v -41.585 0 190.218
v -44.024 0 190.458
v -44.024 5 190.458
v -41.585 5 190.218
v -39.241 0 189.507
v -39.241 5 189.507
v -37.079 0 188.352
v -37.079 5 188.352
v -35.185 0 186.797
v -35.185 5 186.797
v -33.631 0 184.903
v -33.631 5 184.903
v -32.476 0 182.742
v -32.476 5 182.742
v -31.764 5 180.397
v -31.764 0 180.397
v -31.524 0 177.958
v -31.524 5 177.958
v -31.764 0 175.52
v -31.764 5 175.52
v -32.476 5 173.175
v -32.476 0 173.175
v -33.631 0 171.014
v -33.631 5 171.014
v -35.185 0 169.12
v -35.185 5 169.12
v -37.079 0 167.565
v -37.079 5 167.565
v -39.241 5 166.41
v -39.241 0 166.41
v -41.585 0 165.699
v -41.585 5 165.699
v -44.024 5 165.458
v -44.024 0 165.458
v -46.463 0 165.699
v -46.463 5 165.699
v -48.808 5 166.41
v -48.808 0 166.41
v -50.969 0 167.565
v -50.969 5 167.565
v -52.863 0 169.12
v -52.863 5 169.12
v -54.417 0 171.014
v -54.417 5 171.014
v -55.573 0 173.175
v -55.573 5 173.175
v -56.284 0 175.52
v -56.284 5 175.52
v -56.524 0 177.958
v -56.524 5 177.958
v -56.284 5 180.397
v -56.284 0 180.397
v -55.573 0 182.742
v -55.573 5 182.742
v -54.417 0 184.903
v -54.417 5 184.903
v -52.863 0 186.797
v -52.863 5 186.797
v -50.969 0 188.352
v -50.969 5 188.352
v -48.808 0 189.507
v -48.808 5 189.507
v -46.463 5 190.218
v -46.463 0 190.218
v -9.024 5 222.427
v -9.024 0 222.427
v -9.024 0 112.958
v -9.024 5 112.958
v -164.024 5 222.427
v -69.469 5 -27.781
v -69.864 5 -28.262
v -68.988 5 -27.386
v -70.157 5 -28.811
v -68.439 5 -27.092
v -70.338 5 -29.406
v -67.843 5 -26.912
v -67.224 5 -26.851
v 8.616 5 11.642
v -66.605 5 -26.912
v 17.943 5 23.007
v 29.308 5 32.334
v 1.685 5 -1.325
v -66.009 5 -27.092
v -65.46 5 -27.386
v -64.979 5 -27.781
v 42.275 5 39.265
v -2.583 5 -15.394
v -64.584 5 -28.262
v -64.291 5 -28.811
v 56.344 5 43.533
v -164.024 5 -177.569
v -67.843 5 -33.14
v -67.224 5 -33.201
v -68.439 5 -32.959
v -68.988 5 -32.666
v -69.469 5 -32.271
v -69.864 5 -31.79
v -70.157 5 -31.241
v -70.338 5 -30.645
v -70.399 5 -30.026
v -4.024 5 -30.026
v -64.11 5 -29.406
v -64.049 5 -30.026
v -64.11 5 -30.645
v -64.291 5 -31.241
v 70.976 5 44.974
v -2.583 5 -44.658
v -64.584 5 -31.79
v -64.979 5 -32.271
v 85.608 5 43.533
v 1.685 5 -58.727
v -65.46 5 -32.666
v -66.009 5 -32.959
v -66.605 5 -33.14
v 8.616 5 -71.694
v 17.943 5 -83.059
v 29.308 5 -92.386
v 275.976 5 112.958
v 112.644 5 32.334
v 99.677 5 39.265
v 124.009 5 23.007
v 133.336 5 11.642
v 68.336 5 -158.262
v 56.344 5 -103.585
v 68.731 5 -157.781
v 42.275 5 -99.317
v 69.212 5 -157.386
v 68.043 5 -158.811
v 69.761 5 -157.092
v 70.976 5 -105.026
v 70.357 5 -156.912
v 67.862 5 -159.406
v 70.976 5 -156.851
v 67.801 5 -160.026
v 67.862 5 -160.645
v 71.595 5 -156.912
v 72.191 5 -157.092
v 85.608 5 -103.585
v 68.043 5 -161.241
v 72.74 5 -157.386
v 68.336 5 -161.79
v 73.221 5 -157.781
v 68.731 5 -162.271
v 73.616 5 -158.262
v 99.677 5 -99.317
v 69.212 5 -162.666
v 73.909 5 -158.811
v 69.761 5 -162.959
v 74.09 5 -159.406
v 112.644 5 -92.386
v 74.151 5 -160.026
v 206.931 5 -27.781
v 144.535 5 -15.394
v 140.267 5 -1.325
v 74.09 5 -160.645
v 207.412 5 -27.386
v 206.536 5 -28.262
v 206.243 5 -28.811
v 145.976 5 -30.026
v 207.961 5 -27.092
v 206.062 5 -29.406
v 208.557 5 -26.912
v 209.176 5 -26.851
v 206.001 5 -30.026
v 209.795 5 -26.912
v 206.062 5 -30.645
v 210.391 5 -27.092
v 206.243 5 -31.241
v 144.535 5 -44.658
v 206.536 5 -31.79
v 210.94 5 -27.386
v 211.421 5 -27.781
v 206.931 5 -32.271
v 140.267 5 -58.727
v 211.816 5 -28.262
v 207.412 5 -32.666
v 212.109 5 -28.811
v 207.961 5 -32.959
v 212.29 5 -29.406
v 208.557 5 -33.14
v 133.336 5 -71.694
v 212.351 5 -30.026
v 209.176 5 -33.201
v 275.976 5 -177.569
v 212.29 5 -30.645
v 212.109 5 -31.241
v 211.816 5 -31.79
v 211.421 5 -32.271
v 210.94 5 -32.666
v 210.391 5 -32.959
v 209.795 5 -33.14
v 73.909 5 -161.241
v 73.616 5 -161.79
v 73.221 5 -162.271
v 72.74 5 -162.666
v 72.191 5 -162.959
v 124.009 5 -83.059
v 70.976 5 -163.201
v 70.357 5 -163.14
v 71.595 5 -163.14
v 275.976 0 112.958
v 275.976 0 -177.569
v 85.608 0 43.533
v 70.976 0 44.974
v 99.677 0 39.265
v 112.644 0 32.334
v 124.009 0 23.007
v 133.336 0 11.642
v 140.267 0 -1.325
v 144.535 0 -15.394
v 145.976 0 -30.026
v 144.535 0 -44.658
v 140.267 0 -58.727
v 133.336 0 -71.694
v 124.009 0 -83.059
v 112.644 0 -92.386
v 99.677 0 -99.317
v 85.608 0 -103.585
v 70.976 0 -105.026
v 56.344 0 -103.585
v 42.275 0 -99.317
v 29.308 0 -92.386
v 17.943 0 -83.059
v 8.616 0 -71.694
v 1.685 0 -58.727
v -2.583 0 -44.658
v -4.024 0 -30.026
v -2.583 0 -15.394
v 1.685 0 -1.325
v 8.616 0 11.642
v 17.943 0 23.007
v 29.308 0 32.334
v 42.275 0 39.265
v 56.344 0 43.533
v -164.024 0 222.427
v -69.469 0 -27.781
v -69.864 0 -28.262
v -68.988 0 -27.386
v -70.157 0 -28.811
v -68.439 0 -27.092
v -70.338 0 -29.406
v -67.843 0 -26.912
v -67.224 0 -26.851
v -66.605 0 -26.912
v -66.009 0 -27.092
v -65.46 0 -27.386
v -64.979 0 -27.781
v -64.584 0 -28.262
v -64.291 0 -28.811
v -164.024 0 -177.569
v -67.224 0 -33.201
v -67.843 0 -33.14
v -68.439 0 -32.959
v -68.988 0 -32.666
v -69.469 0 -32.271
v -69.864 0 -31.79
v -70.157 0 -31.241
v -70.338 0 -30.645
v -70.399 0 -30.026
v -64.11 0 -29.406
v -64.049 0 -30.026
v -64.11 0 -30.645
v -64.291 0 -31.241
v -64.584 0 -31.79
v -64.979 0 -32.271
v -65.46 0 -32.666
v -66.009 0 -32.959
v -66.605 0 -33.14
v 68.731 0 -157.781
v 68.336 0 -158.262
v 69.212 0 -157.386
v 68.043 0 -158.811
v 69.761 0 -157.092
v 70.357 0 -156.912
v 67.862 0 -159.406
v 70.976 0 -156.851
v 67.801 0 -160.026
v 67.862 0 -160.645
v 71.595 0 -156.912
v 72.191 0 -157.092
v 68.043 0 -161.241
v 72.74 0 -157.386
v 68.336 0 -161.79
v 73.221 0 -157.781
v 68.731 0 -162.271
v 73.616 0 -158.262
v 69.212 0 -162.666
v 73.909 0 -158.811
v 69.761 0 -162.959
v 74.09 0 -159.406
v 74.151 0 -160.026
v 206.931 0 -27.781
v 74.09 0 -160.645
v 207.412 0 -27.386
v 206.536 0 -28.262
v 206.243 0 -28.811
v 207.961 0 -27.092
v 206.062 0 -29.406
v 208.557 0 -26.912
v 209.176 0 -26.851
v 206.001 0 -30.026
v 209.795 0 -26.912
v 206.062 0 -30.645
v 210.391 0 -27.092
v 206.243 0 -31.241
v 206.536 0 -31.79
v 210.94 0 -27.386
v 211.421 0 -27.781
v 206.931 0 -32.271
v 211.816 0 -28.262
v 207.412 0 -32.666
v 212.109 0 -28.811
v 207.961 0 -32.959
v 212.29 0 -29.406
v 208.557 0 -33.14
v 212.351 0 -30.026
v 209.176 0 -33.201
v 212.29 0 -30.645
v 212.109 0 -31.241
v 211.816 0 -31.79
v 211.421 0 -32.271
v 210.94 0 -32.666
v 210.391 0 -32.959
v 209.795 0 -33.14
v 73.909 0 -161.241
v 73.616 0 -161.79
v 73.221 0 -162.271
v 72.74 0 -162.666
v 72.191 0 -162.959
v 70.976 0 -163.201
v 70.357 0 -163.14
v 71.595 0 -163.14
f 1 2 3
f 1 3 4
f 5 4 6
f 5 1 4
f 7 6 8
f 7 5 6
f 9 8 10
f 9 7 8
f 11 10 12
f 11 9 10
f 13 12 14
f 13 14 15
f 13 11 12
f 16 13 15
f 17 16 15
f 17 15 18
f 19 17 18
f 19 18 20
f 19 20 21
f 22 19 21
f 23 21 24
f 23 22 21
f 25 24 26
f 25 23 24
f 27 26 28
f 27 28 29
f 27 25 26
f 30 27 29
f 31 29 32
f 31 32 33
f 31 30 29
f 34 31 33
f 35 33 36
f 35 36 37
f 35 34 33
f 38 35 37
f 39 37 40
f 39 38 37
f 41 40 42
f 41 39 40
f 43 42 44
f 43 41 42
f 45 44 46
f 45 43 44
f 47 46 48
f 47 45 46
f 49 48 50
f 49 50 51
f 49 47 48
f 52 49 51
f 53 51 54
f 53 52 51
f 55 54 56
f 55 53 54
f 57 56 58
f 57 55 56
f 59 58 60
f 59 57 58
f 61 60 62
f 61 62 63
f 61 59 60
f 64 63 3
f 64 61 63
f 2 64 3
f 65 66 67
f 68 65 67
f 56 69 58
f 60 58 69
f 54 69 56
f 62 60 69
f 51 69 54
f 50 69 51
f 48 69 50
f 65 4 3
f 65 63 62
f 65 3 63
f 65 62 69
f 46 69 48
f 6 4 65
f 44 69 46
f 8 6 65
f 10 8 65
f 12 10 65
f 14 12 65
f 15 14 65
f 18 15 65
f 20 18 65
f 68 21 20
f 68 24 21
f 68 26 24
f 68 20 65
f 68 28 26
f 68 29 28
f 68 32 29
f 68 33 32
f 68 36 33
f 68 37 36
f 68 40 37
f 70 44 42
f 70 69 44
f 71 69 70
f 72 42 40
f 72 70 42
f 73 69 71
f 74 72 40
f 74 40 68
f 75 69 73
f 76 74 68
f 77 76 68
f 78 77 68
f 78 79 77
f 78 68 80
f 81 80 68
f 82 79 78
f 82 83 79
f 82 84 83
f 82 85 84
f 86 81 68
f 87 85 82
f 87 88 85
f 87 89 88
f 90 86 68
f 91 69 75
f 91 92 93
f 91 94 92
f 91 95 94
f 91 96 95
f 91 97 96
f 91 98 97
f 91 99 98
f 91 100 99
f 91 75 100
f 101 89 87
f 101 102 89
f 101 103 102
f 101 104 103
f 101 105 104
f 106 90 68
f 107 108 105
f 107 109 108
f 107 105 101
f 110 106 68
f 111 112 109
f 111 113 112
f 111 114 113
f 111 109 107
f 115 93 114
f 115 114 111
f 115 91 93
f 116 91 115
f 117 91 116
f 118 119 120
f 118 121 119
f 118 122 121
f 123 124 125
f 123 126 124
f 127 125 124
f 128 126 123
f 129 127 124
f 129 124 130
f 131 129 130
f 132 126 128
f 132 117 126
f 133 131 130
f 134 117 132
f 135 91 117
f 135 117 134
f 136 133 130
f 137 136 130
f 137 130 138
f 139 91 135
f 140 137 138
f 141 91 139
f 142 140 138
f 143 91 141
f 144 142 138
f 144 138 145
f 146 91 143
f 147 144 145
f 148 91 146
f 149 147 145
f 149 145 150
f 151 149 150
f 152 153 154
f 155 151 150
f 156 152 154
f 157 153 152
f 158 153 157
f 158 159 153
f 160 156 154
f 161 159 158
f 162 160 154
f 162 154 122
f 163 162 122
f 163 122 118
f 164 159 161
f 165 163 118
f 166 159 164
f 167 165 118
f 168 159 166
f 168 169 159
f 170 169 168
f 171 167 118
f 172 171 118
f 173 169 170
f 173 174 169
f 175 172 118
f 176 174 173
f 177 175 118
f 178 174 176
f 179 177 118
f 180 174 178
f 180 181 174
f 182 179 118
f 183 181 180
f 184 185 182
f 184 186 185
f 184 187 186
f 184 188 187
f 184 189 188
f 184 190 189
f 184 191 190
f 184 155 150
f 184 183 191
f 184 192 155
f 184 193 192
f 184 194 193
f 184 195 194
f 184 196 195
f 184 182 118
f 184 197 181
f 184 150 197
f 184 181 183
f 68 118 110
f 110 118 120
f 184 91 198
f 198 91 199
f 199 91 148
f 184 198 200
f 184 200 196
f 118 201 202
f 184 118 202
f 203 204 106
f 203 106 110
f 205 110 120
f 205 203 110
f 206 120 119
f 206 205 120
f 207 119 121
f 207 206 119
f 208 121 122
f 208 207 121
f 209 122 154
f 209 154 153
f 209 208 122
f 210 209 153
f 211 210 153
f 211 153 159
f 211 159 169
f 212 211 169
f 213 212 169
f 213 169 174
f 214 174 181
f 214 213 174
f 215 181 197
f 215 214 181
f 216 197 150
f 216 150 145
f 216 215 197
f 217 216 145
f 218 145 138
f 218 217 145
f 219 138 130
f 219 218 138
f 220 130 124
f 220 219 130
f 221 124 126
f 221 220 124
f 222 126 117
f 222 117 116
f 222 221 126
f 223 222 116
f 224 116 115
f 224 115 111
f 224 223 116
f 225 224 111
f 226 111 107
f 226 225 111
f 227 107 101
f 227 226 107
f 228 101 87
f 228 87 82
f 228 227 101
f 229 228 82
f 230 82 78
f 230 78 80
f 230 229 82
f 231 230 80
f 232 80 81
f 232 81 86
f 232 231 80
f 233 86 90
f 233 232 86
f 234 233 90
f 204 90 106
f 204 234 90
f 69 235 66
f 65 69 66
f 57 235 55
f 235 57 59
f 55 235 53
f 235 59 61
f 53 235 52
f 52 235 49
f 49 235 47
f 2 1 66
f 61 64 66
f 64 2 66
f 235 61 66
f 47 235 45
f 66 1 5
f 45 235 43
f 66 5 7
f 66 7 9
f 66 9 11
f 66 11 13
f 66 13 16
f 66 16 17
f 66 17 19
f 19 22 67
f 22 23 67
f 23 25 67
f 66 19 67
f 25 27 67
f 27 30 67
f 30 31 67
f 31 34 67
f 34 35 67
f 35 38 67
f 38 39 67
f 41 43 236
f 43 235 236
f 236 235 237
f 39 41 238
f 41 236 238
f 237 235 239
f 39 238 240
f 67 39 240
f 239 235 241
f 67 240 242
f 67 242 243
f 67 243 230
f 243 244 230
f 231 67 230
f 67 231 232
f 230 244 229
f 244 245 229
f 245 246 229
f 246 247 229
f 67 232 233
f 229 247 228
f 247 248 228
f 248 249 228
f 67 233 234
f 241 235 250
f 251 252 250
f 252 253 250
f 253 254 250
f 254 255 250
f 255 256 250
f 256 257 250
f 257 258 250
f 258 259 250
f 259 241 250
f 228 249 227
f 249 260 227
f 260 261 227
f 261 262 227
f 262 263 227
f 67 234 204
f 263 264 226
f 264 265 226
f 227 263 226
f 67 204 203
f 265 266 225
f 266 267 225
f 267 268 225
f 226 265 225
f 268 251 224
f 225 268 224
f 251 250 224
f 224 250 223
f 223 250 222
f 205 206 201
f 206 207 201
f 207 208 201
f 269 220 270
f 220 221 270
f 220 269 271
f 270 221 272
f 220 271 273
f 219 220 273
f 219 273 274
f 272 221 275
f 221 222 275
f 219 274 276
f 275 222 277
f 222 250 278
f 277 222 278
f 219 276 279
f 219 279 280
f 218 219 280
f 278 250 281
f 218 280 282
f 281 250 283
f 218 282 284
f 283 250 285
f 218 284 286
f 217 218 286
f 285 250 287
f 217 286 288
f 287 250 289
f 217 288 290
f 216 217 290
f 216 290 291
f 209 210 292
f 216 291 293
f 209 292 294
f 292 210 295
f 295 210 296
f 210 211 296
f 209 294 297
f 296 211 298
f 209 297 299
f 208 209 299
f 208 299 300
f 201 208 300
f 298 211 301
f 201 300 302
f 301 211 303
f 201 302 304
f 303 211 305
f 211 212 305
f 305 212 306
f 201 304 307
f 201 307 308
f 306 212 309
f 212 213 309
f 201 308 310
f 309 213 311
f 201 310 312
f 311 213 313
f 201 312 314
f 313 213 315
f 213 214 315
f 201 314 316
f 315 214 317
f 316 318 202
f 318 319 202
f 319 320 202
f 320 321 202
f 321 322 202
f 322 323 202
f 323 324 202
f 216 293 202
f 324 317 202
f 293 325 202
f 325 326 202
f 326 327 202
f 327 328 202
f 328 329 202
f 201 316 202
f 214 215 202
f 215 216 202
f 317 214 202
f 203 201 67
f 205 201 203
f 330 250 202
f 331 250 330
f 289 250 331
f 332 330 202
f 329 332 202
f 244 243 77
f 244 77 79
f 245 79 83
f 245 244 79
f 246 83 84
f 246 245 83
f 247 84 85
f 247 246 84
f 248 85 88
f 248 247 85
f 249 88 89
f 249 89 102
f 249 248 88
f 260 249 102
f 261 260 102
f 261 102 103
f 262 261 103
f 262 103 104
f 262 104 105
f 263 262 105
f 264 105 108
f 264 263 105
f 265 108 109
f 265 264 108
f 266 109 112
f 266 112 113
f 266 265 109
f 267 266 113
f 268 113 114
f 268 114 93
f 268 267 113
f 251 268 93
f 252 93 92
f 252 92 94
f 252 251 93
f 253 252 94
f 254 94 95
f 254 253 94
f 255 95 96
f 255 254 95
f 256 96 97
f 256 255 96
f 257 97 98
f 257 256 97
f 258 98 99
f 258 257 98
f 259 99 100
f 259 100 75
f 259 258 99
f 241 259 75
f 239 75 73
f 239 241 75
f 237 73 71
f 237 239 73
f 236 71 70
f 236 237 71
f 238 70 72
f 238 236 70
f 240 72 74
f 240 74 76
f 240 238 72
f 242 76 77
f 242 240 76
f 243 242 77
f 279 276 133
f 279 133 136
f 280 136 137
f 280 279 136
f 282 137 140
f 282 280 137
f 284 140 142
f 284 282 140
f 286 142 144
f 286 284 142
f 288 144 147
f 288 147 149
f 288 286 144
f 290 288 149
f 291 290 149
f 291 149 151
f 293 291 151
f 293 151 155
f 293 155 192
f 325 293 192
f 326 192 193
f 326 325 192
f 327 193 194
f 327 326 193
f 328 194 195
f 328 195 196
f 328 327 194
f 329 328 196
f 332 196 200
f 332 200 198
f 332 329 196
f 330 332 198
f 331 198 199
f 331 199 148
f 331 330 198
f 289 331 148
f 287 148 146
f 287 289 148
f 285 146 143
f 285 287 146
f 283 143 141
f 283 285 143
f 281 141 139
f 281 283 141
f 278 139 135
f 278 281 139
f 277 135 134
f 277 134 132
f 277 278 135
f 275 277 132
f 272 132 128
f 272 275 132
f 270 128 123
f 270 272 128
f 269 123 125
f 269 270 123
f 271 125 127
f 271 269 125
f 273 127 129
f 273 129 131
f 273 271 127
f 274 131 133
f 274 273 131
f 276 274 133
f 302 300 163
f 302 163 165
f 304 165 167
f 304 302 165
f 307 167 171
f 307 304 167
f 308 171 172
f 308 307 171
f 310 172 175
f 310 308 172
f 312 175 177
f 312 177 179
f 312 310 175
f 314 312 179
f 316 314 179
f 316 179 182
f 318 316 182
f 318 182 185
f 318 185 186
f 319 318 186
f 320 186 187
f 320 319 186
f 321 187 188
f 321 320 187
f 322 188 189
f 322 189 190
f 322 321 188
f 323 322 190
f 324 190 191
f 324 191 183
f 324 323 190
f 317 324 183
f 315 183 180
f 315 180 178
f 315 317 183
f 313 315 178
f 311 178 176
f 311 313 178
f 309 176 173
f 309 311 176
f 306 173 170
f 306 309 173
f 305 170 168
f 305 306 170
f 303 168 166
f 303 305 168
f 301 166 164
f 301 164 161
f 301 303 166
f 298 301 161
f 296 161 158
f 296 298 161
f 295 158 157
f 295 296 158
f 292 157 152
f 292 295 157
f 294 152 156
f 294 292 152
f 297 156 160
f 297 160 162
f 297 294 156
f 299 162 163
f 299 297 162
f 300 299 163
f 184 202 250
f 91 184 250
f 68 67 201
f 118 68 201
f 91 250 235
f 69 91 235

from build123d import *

# Parameters (mm, degrees)
CROQUIS2_R              = 75
CROQUIS2_R_2            = 3.175
CROQUIS2_R_3            = 12.5
SALIENTE_EXTRUIR2_DEPTH = 5


with BuildPart() as part:
    # Croquis2 → Saliente-Extruir2 (new body)
    with BuildSketch(Plane(origin=(0, 0, 0), x_dir=(1, 0, 0), z_dir=(0, 1, 0))):
        Polygon((-164.024069274, 177.568942162), (-164.024069274, -142.431057838), (-164.024069274, -189.256710106), (-164.024069274, -222.426710106), (-79.024069274, -222.426710106), (-9.024069274, -222.426710106), (-9.024069274, -112.958468136), (275.975930726, -112.958468136), (275.975930726, 177.568942162), align=None)
        with Locations(Location((70.975930726, 30.02579809, 0), (0, 0, 270))):
            Circle(CROQUIS2_R, mode=Mode.SUBTRACT)
        with Locations(Location((209.175930726, 30.02579809, 0), (0, 0, 270))):
            Circle(CROQUIS2_R_2, mode=Mode.SUBTRACT)
        with Locations(Location((-67.224069274, 30.02579809, 0), (0, 0, 270))):
            Circle(CROQUIS2_R_2, mode=Mode.SUBTRACT)
        with Locations(Location((70.975930726, 160.02579809, 0), (0, 0, 270))):
            Circle(CROQUIS2_R_2, mode=Mode.SUBTRACT)
        with Locations(Location((-44.024069274, -177.958468136, 0), (0, 0, 270))):
            Circle(CROQUIS2_R_3, mode=Mode.SUBTRACT)
    extrude(amount=SALIENTE_EXTRUIR2_DEPTH)


solid = part.part
